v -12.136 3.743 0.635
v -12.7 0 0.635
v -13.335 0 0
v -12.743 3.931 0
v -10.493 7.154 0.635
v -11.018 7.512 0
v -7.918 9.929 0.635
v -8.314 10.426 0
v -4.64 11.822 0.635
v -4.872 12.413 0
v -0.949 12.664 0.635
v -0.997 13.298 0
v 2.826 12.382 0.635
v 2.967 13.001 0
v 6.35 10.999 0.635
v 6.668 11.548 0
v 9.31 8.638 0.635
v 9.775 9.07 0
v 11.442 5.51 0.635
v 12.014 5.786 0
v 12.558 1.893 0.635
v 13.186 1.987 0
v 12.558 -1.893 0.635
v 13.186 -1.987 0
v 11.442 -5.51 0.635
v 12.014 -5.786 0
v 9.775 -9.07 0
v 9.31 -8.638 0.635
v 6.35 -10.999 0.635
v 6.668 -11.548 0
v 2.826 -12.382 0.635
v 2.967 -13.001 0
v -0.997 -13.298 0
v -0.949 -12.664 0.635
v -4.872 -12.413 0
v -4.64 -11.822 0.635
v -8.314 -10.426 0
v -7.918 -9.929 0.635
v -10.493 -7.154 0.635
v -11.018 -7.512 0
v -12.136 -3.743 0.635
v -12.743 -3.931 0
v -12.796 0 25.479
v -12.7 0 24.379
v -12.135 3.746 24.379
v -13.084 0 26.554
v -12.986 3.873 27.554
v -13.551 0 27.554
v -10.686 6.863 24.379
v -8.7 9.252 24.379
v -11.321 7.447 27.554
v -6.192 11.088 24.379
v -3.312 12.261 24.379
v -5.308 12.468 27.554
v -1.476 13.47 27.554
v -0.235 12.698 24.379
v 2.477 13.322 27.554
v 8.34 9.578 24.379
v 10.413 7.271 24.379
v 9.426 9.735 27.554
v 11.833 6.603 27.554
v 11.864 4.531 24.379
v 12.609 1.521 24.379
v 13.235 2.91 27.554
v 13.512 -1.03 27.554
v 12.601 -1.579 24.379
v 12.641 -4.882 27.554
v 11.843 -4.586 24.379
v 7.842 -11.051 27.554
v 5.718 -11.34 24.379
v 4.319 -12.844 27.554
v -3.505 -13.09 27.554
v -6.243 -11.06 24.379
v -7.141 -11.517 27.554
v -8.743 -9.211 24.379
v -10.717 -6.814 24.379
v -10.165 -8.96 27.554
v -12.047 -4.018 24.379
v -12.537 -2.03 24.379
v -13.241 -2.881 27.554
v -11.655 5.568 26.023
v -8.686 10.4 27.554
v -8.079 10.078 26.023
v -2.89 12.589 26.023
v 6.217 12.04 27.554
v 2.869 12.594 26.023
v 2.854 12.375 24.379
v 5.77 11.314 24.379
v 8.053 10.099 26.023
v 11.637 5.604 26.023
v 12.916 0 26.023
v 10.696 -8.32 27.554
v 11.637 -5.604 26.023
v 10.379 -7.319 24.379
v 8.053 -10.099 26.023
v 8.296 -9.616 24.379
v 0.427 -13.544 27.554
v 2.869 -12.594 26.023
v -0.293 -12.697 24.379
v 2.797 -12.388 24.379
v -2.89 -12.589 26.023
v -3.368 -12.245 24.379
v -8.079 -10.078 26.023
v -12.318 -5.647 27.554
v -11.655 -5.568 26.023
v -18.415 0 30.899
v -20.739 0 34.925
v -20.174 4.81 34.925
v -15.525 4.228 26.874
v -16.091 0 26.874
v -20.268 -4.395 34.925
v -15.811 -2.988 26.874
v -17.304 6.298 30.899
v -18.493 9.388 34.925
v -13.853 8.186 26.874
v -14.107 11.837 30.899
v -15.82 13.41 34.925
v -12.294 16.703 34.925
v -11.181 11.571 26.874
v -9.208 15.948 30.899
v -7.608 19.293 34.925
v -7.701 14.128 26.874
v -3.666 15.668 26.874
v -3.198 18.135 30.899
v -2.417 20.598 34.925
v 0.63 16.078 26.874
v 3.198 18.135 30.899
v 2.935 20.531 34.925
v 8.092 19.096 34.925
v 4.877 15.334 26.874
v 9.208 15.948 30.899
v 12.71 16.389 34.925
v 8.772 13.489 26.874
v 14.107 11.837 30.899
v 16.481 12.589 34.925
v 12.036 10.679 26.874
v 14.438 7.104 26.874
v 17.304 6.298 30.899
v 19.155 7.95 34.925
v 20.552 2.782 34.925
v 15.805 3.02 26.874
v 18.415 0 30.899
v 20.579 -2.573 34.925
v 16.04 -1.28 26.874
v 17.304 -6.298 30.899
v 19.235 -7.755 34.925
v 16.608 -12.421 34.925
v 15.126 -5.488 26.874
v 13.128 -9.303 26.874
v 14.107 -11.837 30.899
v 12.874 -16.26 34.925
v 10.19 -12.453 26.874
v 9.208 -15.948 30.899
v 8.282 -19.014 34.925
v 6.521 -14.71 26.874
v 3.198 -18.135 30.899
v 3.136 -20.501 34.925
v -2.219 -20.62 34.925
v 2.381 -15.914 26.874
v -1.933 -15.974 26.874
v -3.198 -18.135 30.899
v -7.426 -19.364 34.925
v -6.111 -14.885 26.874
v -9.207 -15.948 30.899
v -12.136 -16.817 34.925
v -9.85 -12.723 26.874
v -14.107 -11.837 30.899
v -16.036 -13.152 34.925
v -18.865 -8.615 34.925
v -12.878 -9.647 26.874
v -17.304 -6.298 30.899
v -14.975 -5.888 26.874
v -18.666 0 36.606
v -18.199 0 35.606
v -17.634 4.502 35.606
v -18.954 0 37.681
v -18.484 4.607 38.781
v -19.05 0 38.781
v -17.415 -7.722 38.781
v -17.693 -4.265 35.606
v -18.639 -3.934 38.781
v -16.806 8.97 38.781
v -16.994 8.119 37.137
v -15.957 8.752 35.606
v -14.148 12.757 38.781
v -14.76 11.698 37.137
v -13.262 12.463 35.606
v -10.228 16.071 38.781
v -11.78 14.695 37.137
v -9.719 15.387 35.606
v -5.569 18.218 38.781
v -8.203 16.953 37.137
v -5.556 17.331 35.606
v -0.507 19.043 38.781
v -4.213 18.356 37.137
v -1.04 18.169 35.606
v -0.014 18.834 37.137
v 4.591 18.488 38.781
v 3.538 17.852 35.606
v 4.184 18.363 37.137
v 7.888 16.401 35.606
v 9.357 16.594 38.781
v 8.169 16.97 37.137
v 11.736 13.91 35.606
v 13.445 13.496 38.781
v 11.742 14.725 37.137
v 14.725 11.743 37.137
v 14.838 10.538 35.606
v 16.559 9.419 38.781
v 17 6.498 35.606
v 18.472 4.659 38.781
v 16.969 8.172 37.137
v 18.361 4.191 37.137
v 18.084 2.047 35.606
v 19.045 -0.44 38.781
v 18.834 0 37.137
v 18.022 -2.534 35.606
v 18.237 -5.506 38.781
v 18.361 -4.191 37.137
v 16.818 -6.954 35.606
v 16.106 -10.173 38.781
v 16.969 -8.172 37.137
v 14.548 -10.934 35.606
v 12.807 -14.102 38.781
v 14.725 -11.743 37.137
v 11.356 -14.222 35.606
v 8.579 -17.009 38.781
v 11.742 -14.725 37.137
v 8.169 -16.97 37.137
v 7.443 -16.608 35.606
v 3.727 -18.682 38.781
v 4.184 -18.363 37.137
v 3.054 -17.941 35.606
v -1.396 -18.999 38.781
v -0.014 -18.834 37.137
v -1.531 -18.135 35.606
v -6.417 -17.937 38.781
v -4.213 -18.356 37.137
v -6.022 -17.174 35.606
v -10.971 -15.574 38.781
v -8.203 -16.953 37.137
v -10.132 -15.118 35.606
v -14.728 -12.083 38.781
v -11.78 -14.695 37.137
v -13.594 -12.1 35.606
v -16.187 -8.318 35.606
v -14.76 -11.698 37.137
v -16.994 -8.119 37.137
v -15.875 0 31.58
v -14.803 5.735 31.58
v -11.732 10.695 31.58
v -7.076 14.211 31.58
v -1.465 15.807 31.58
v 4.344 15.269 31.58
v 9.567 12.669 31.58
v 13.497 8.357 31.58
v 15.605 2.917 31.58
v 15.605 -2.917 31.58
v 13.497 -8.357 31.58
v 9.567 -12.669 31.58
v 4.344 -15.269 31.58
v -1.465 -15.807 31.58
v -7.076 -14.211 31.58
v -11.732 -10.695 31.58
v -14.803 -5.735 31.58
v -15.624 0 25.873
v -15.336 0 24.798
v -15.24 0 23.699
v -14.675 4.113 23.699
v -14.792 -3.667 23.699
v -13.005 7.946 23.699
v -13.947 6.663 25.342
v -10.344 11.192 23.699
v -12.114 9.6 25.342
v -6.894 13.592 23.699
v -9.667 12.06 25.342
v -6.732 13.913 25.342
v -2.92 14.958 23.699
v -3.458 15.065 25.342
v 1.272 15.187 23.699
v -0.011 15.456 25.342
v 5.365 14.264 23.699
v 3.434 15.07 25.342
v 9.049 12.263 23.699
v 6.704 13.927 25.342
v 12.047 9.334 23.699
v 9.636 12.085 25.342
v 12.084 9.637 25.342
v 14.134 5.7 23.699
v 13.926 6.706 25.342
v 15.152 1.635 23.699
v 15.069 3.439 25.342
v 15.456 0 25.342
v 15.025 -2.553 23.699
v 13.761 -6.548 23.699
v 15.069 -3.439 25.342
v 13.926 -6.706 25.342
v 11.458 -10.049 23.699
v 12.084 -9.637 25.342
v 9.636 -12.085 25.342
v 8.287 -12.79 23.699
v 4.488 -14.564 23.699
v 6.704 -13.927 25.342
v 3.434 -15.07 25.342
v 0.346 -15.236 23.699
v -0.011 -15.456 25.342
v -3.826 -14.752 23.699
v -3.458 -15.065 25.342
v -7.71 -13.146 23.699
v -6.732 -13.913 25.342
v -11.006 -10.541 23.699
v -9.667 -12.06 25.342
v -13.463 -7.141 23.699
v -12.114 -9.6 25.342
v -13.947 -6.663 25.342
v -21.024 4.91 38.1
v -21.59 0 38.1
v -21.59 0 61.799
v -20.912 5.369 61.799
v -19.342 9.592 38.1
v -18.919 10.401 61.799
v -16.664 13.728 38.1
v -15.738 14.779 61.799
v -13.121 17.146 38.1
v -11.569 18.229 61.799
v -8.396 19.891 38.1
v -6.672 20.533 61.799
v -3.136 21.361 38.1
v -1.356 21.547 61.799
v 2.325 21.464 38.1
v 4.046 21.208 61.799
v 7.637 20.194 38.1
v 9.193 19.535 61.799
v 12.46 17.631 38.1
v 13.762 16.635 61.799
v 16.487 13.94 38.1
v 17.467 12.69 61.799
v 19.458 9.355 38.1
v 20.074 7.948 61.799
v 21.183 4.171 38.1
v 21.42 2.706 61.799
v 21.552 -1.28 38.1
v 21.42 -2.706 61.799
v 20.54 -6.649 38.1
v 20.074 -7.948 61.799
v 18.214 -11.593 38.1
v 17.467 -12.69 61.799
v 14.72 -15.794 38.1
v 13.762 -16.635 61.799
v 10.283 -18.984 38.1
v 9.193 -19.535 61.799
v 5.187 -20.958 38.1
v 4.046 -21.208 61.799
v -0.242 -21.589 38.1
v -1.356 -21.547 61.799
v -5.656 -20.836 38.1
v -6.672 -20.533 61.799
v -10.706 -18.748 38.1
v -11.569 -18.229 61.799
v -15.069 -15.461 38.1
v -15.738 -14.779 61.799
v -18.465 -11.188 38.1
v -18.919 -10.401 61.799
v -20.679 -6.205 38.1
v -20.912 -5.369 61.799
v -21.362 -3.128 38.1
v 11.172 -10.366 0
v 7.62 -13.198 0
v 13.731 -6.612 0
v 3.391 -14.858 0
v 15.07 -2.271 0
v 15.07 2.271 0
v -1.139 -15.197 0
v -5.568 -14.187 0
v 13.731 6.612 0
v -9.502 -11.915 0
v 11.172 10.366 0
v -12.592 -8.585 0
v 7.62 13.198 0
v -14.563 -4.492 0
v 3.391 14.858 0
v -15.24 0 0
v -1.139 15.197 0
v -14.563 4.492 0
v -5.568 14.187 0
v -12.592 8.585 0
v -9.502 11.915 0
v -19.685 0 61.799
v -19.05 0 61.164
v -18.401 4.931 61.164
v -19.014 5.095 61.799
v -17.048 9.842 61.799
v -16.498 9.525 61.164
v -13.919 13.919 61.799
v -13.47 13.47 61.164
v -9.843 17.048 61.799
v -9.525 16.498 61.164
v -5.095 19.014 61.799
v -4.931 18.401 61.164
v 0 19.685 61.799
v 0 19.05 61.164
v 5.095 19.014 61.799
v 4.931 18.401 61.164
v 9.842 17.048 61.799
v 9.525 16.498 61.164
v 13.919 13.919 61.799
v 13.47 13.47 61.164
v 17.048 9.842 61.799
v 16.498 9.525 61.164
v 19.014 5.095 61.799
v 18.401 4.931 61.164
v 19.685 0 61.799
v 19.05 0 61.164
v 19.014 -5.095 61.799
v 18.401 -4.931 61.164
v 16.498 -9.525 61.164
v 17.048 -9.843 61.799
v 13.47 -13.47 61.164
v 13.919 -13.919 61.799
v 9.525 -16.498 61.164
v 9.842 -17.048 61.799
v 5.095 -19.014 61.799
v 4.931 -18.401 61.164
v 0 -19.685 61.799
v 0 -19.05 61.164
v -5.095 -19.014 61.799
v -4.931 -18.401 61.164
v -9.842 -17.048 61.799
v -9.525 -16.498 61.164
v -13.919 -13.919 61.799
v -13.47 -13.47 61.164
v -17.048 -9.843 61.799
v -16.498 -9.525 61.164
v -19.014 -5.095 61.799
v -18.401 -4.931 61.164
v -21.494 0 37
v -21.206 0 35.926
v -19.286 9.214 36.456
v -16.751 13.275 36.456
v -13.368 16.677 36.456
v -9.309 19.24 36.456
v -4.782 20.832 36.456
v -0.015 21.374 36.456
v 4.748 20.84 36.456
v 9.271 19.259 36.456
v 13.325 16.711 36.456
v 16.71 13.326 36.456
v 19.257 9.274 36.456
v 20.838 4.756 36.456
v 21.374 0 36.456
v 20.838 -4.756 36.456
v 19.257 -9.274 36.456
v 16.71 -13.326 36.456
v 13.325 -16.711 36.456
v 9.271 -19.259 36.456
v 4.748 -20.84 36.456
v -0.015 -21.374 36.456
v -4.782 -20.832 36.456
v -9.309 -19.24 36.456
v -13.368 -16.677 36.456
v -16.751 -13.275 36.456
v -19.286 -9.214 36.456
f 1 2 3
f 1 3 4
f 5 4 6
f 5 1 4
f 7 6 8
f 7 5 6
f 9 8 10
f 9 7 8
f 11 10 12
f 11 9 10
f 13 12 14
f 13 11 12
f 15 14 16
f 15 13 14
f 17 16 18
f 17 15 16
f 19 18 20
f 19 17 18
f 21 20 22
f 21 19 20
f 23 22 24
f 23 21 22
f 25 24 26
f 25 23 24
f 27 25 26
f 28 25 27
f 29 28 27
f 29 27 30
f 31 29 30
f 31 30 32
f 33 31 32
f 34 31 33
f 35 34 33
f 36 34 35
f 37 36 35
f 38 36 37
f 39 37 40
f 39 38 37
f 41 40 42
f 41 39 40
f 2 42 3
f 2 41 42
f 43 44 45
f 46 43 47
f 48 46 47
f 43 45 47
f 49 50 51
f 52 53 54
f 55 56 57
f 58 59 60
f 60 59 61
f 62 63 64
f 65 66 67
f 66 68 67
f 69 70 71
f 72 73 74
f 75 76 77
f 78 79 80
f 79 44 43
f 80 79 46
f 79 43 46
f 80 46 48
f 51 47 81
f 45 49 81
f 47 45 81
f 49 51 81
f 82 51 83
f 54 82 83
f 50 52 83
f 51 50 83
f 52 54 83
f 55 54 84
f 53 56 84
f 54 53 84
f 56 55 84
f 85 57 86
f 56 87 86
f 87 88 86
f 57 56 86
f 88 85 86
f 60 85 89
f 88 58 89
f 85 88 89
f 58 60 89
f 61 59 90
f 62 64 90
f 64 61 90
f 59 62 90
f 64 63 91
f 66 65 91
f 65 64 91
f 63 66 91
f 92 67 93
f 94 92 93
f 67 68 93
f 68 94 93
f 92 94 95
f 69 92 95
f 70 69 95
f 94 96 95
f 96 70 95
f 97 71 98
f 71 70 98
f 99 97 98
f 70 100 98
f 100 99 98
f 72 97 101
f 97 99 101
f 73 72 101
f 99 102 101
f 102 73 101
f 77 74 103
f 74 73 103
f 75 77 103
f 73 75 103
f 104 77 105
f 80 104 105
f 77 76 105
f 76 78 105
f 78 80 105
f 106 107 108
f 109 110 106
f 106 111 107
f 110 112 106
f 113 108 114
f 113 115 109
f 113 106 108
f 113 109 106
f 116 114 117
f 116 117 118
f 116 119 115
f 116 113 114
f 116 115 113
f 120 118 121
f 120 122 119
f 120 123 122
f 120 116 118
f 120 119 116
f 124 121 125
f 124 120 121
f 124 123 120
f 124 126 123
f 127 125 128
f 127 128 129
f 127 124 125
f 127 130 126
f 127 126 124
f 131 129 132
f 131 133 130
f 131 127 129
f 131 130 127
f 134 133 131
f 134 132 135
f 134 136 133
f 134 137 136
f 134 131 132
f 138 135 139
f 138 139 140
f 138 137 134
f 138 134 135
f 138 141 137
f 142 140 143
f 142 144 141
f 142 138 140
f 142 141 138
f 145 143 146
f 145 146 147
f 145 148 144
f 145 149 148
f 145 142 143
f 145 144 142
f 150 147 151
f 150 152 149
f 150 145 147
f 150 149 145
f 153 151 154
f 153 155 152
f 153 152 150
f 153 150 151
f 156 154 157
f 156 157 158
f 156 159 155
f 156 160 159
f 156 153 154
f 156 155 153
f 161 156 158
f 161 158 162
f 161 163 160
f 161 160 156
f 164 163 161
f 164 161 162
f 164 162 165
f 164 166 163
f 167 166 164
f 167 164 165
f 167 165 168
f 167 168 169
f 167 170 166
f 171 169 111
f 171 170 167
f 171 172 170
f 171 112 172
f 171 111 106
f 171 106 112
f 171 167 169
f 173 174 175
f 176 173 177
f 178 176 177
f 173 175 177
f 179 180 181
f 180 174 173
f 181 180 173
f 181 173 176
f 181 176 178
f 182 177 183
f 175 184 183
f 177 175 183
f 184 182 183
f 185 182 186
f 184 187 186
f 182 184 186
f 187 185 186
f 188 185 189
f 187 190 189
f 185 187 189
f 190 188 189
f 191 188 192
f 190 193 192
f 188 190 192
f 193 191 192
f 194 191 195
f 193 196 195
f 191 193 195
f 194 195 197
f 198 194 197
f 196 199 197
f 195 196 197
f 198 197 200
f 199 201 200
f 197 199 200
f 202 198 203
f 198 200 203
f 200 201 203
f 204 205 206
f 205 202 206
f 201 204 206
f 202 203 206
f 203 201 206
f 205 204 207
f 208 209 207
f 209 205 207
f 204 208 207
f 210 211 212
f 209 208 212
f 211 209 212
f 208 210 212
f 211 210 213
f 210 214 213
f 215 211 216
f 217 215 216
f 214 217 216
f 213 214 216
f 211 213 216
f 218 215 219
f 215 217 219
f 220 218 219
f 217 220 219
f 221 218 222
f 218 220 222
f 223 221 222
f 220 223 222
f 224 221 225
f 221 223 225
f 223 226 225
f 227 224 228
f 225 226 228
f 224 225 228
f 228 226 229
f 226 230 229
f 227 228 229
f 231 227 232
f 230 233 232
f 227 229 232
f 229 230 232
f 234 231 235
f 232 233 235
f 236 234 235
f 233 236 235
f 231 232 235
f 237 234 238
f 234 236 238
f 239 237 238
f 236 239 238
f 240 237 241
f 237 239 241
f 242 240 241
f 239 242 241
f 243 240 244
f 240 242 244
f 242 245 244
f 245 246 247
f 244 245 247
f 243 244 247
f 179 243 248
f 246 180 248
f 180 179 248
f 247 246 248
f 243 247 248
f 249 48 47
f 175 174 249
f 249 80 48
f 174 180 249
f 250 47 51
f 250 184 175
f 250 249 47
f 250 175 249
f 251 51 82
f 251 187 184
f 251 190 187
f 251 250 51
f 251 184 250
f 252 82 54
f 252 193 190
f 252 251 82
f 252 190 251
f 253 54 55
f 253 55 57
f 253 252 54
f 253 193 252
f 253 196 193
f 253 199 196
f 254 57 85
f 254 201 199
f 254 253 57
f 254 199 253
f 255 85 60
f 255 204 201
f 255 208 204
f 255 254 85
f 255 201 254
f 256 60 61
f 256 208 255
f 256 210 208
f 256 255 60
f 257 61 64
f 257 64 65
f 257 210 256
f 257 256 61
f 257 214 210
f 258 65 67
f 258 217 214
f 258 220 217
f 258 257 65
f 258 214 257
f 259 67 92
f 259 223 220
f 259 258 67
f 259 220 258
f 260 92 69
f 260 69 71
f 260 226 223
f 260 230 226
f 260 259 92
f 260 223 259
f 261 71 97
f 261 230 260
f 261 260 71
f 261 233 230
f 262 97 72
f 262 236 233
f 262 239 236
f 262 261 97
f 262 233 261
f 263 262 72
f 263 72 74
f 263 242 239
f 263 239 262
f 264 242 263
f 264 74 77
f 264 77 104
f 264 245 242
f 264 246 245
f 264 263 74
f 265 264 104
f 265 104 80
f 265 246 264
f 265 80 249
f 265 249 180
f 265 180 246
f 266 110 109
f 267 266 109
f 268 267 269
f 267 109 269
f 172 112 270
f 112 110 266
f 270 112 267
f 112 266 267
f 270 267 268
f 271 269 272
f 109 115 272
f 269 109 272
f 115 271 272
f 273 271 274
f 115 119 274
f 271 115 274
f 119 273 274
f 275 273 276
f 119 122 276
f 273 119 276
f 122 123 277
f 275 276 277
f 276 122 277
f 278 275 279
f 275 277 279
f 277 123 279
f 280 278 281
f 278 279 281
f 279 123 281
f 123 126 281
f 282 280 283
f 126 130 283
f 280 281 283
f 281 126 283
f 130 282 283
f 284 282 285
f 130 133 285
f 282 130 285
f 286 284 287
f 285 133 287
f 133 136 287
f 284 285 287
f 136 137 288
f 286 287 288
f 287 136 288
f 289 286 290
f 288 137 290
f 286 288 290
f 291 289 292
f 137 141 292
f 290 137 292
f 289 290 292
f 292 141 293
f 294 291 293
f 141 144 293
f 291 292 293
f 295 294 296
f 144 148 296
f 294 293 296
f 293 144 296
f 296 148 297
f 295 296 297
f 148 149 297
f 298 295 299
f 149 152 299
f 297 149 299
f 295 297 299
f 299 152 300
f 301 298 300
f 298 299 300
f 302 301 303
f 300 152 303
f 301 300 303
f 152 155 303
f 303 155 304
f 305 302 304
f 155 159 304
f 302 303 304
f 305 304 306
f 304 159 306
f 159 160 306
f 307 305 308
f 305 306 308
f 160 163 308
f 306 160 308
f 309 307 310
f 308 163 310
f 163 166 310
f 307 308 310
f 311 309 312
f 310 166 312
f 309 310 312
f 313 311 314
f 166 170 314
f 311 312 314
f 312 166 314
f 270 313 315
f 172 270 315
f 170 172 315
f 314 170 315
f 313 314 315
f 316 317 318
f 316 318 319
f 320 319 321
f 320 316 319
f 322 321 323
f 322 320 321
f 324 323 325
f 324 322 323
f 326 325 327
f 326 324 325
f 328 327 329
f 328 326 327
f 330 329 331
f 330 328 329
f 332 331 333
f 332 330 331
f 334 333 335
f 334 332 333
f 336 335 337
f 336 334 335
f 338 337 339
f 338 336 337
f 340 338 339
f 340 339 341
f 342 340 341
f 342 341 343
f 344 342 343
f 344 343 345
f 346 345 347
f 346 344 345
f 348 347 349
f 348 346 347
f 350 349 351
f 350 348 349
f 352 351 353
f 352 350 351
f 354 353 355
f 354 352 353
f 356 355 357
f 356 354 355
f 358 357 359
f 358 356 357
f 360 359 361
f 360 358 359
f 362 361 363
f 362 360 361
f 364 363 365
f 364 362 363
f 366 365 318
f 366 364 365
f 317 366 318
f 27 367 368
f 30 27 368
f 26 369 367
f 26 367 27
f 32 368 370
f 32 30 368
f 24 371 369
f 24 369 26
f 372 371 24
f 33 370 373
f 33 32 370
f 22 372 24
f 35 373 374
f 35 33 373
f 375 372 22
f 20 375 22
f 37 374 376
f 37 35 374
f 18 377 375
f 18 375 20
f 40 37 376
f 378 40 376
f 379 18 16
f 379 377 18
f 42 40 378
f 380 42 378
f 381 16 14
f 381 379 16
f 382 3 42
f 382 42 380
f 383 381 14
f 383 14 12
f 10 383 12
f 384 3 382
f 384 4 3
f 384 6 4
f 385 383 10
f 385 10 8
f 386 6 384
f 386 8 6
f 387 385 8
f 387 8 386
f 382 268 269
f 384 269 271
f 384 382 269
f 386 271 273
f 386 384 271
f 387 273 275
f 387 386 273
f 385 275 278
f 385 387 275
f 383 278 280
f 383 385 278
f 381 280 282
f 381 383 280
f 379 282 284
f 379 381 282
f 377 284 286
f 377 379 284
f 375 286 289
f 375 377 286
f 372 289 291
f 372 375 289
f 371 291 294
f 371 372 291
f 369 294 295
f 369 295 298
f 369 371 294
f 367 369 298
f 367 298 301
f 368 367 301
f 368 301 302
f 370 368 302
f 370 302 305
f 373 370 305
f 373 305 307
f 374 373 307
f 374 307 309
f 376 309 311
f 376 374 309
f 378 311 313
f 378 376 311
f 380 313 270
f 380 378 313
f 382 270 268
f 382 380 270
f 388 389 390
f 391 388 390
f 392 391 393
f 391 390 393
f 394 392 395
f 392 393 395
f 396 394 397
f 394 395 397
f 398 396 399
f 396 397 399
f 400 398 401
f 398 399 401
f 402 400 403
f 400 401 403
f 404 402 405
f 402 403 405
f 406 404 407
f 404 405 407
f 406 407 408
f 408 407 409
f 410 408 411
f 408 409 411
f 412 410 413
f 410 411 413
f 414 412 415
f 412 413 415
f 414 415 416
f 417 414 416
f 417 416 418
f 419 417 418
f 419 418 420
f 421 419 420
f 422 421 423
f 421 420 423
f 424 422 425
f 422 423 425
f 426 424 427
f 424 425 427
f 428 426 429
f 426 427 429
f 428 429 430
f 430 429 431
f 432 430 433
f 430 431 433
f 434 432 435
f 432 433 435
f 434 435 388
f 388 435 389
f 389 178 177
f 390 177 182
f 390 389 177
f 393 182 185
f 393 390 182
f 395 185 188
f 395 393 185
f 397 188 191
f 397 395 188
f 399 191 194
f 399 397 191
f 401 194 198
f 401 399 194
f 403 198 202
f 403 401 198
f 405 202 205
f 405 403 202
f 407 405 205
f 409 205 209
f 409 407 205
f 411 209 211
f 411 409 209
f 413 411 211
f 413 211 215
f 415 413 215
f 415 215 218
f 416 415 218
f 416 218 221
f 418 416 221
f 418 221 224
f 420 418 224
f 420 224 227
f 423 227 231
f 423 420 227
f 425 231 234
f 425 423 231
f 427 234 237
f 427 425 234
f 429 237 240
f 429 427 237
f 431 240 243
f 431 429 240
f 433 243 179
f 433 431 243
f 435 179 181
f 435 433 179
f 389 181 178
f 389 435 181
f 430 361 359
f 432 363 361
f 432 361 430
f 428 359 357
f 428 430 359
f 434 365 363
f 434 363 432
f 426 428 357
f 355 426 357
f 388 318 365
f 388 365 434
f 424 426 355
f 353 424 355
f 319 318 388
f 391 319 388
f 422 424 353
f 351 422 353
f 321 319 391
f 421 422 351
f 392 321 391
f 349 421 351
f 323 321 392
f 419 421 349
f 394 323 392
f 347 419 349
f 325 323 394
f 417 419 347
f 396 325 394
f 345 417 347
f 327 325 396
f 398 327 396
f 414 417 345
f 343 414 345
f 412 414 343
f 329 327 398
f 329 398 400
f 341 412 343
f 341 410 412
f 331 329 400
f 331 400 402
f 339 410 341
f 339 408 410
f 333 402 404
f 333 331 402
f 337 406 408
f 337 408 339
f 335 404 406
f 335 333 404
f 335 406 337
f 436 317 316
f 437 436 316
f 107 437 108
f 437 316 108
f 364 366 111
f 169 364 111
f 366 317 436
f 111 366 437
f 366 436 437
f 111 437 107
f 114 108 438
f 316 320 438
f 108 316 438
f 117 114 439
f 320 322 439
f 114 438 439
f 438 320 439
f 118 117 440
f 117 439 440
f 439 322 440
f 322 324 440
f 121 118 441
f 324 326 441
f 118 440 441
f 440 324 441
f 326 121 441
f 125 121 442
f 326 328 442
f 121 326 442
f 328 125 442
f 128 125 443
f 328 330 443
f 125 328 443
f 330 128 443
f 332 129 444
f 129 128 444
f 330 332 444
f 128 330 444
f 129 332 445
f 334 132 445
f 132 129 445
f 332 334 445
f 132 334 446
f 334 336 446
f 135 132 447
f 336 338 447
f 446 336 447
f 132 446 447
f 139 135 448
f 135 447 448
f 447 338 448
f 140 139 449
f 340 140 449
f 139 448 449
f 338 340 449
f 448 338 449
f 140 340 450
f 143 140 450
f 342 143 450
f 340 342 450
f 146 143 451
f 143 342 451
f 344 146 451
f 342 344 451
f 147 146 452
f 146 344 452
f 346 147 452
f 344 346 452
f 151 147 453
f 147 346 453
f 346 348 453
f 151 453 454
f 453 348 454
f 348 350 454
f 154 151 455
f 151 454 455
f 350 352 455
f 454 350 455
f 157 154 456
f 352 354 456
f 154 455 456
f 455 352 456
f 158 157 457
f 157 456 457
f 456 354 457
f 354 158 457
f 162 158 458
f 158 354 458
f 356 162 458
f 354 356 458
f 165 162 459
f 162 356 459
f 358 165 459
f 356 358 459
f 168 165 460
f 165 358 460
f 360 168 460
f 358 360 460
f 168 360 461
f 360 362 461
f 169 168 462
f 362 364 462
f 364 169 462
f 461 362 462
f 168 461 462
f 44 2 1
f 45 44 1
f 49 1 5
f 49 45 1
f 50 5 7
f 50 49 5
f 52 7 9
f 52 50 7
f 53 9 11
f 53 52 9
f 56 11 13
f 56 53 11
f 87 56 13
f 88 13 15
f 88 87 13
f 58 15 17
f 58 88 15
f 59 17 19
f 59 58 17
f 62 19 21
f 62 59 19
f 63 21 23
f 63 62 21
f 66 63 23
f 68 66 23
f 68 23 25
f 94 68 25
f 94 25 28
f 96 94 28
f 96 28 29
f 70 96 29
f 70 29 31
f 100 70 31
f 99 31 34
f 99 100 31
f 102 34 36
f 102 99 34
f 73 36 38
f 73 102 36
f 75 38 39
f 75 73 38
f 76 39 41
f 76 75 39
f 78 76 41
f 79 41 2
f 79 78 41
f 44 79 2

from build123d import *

# Parameters (mm, degrees)
F2_R    = 6.35
F3_SIZE = 0.635


with BuildPart() as f1:
    # F0 (on Front) → F1 (revolve)
    with BuildSketch(Plane.XZ):
        Polygon((-19.05, 61.798523), (-21.59, 61.798523), (-21.59, 36.398523), (-15.24, 25.4), (-15.24, 0), (-12.7, 0), (-12.7, 26.080591), (-19.05, 37.079114), align=None)
    revolve(axis=Axis((0, 0, 30.899261), (0, 0, -1)))

    # F2
    f2_edges = [f1.edges().sort_by_distance(p)[0] for p in [
        (21.59, 0, 36.398523),
        (15.24, 0, 25.4),
        (19.05, 0, 37.079114),
        (12.7, 0, 26.080591),
    ]]
    fillet(f2_edges, radius=F2_R)

    # F3
    f3_edges = [f1.edges().sort_by_distance(p)[0] for p in [
        (12.7, 0, 0),
        (19.05, 0, 61.798523),
    ]]
    chamfer(f3_edges, length=F3_SIZE)


solid = f1.part
